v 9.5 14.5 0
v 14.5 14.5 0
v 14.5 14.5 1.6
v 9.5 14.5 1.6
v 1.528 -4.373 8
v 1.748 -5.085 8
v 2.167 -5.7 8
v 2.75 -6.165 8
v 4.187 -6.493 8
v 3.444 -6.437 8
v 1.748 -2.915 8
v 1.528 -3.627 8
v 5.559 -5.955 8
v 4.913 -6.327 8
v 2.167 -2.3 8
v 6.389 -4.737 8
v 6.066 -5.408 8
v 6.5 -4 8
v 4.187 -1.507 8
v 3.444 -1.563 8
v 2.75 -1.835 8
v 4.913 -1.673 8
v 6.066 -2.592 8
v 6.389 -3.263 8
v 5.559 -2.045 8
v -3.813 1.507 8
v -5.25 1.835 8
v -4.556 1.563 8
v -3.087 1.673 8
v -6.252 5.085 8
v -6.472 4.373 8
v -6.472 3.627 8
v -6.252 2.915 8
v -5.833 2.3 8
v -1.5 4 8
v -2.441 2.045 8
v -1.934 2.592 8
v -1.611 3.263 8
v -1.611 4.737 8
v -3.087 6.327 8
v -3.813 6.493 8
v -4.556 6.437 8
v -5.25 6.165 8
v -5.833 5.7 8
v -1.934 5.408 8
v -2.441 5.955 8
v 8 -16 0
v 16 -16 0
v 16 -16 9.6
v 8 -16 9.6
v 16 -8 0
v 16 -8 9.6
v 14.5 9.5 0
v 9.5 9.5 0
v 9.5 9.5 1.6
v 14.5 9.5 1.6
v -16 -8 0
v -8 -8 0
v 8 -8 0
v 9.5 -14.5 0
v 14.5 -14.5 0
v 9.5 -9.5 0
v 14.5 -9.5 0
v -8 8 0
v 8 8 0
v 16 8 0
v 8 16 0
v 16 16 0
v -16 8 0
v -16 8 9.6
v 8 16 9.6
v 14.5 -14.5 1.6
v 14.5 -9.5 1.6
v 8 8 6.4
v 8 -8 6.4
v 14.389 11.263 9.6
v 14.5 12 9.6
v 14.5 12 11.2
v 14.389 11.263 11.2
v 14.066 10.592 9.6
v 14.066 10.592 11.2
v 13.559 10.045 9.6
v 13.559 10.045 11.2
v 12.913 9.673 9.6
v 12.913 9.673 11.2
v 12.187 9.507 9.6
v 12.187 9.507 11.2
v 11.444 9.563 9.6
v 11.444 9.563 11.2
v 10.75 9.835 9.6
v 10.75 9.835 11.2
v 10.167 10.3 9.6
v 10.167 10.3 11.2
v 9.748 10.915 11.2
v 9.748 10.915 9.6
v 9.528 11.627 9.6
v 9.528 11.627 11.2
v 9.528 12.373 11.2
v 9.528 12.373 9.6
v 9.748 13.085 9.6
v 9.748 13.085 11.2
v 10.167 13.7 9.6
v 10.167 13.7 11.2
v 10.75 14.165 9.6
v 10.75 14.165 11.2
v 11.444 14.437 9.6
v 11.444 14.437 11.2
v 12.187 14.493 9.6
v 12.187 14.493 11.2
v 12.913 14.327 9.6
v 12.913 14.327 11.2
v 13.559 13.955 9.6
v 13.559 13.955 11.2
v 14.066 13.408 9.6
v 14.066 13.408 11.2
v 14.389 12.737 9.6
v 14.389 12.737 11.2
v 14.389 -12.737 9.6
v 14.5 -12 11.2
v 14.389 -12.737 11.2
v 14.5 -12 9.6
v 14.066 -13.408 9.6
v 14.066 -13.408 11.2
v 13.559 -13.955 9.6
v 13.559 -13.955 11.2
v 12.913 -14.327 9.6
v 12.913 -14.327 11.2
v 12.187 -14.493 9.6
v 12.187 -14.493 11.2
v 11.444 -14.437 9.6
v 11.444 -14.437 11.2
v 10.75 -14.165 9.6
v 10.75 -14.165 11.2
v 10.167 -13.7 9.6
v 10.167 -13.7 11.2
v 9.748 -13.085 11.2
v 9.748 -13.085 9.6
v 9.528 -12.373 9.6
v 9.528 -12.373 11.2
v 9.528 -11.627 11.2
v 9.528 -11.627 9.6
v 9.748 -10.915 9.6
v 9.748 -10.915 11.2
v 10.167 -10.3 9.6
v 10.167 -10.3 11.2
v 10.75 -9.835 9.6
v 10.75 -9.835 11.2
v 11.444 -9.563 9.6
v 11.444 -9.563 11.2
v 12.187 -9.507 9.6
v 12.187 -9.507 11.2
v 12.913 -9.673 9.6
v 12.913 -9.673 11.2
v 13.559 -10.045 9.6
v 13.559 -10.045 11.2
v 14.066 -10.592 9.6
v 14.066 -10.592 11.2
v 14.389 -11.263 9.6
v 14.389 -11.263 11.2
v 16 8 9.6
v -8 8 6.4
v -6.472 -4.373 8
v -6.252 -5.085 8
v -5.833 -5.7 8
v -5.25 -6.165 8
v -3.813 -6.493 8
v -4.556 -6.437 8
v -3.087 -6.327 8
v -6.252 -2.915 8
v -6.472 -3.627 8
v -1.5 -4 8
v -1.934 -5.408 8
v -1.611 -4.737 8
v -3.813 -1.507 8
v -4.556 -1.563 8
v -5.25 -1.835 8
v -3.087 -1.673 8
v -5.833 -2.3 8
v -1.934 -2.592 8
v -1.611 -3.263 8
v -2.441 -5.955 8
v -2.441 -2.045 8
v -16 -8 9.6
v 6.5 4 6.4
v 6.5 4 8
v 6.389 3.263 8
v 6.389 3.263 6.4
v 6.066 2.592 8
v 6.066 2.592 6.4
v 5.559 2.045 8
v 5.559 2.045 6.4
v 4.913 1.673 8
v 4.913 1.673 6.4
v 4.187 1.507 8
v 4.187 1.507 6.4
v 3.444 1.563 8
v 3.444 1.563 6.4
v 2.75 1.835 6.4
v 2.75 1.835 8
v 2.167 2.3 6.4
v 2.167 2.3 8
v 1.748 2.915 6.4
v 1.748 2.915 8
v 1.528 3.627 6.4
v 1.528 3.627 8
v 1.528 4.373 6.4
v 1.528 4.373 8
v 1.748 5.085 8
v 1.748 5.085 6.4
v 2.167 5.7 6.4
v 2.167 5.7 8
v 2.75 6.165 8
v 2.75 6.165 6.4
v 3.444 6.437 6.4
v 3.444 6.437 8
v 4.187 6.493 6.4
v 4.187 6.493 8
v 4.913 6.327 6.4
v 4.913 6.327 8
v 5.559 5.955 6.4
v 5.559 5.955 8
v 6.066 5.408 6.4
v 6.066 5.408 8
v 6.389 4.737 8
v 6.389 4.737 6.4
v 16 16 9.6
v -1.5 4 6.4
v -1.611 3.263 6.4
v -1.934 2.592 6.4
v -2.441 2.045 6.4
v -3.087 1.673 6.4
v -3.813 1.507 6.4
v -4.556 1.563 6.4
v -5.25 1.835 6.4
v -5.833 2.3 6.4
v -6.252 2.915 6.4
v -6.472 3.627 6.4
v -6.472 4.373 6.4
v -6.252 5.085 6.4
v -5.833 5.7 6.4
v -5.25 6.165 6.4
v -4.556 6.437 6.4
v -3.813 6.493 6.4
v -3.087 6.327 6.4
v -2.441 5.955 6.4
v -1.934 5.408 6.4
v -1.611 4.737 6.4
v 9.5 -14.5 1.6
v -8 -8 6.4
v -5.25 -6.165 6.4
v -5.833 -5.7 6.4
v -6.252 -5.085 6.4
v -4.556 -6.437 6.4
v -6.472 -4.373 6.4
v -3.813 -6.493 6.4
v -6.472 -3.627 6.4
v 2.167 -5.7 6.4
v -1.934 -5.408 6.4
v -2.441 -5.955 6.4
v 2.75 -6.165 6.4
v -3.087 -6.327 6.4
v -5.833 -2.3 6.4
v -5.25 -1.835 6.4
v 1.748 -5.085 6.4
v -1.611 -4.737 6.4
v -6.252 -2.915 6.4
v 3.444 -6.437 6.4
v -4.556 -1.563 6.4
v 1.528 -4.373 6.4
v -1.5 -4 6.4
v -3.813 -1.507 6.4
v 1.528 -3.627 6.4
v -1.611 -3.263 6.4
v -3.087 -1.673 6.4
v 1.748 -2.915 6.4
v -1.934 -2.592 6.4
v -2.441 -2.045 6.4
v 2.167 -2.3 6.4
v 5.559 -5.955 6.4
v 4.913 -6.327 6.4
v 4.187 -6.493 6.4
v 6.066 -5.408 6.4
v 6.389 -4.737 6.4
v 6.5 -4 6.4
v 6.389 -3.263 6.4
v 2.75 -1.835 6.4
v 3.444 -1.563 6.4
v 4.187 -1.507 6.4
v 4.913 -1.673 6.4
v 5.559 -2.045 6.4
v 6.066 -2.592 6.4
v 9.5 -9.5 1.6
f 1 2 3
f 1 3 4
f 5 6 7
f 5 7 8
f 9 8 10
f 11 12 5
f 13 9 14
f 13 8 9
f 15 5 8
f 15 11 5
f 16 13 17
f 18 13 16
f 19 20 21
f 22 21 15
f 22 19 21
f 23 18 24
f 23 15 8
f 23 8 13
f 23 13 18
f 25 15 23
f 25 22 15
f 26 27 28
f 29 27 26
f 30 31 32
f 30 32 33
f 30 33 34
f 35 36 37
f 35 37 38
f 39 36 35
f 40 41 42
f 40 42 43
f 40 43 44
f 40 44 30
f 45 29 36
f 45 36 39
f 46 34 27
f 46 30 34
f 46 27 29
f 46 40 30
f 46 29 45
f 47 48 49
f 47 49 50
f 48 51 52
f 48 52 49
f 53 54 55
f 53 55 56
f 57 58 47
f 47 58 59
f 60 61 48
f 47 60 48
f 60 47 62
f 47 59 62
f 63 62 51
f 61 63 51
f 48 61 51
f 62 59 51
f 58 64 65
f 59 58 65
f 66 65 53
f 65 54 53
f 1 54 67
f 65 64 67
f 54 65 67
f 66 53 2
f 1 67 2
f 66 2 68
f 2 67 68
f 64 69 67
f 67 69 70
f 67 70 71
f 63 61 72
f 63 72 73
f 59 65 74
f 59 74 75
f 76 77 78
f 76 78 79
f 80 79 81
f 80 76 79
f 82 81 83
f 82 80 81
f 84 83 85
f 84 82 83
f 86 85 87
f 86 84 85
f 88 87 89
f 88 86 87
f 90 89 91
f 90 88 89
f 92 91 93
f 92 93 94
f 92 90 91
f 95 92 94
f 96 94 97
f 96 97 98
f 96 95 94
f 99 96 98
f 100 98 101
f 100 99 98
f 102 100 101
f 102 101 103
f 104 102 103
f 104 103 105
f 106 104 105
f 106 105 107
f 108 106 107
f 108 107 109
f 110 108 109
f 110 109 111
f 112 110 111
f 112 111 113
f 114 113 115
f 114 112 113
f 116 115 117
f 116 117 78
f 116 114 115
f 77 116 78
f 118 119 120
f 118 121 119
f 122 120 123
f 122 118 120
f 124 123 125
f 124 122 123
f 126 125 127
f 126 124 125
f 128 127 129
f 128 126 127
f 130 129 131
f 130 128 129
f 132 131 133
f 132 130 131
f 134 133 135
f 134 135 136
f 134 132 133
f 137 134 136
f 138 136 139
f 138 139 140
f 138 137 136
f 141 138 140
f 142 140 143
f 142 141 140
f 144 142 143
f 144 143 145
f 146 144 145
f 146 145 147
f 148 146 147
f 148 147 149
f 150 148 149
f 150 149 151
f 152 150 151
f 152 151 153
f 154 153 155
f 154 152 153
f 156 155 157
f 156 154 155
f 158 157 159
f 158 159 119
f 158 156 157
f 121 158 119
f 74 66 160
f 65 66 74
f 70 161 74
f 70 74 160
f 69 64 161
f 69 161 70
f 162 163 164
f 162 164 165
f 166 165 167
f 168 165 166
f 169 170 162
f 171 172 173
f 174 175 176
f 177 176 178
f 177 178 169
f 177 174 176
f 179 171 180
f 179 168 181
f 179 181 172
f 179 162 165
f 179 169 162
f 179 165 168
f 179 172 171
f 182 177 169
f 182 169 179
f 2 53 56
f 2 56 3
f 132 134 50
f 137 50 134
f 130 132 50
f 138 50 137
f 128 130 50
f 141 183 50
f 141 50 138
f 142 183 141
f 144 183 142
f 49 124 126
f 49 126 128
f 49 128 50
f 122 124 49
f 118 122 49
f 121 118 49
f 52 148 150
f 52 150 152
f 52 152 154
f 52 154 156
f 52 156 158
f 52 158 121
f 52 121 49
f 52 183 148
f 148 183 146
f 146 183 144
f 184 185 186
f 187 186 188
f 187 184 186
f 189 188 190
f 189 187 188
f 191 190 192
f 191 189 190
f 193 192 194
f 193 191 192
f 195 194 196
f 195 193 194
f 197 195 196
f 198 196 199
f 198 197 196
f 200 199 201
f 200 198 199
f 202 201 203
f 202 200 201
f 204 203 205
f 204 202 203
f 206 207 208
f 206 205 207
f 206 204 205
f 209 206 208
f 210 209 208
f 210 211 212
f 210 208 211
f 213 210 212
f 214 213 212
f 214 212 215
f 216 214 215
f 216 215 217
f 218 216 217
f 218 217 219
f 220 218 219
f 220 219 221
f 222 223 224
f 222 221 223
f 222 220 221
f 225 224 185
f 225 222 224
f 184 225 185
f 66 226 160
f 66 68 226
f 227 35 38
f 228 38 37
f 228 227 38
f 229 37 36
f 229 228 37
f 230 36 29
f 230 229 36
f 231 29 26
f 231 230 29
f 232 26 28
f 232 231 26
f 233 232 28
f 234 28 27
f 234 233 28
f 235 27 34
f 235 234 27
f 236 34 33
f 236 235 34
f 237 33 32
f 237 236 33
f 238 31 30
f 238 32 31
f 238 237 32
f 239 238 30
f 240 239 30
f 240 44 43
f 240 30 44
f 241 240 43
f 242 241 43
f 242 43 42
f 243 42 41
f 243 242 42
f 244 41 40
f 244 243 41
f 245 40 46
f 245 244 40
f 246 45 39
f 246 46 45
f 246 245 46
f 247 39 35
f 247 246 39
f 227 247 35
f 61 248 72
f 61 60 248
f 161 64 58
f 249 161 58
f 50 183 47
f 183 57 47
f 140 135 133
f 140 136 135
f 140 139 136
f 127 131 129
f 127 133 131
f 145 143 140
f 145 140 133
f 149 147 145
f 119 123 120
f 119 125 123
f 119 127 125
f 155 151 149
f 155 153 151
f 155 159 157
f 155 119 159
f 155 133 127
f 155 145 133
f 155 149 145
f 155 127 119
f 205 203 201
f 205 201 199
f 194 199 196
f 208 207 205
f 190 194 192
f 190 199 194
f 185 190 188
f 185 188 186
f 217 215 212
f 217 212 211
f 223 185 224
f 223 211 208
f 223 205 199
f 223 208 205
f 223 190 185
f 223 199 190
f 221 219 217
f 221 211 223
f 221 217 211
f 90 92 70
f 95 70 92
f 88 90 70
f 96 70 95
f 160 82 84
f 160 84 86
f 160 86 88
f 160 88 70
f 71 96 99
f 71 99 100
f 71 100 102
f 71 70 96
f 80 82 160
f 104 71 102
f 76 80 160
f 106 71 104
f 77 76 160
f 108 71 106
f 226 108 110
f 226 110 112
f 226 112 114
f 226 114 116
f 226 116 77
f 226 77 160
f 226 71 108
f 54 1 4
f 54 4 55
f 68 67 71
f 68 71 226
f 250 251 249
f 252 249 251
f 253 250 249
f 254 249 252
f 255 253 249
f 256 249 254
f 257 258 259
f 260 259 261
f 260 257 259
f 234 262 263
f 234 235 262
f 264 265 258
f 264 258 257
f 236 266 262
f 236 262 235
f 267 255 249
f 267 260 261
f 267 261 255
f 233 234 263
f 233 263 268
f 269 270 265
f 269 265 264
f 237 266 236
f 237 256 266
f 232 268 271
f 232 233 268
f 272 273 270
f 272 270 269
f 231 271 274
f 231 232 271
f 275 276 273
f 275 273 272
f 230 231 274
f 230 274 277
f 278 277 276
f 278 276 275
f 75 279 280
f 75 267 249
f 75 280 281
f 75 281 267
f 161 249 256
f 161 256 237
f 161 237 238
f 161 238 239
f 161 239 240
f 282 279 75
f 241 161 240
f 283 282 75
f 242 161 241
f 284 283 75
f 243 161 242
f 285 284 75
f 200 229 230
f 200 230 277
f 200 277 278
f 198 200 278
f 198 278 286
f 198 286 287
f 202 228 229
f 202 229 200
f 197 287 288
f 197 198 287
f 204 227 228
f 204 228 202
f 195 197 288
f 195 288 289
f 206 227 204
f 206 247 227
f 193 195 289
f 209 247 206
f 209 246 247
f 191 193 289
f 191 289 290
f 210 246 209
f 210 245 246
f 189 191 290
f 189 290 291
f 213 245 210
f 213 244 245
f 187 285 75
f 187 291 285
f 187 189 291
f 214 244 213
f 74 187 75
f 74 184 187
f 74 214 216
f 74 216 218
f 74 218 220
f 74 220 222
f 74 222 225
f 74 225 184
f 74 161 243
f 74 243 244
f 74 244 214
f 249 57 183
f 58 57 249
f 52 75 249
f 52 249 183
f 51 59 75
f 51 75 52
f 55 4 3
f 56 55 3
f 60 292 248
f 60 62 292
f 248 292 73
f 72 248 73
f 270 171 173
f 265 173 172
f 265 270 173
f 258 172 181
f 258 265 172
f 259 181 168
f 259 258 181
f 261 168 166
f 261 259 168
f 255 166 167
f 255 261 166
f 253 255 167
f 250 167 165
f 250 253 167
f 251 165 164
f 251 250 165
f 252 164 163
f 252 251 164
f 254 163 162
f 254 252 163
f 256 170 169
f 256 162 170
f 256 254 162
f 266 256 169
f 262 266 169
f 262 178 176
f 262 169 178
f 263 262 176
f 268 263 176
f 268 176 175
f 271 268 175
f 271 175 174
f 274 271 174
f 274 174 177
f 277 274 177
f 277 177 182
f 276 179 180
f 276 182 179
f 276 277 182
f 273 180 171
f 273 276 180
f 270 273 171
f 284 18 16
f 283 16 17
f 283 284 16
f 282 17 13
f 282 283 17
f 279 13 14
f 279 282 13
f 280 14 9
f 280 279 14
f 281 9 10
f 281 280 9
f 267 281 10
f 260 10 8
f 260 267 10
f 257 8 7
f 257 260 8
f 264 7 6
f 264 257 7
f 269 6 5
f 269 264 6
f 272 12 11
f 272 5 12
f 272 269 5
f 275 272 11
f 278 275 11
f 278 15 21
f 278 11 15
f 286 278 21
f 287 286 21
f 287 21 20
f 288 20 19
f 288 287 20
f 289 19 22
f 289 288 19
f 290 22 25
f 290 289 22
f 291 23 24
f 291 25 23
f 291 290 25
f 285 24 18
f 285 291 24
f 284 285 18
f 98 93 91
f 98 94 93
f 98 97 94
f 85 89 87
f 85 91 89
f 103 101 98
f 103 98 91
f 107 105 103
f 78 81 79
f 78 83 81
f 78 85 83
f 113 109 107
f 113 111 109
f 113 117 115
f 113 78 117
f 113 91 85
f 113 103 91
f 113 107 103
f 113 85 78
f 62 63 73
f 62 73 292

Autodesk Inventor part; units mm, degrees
ref_plane "YZ Plane" through (0, 0, 0) normal (1, 0, 0) x (0, 1, 0)
ref_plane "XZ Plane" through (0, 0, 0) normal (0, 1, 0) x (-1, 0, 0)
ref_plane "XY Plane" through (0, 0, 0) normal (0, 0, 1) x (1, 0, 0)
sketch "Sketch1" plane through (0, 0, 0) normal (0, 0, 1) x (1, 0, 0)
  line L0 (0, -22.4) -> (0, 22.4) construction
  line L1 (-22.4, 0) -> (22.4, 0) construction
  line L2 (-16, 16) -> (16, 16)
  line L3 (16, 16) -> (16, -16)
  line L4 (16, -16) -> (-16, -16)
  line L5 (-16, -16) -> (-16, 16)
  line L6 (16, 8) -> (-16, 8)
  line L7 (8, 8) -> (8, -8)
  line L8 (-16, -8) -> (16, -8)
  line L9 (-16, 8) -> (8, 16)
  line L10 (-16, -8) -> (8, -16)
  line L11 (8, -8) -> (16, -16) construction
  line L12 (8, 8) -> (16, 16) construction
  line L13 (-8, 8) -> (-8, -8)
  line L14 (-4, 4) -> (4, 4) construction
  line L15 (4, 4) -> (4, -4) construction
  line L16 (4, -4) -> (-4, -4) construction
  line L17 (-4, -4) -> (-4, 4) construction
  circle A0 centre (-4, 4) radius 2.5
  circle A1 centre (4, 4) radius 2.5
  circle A2 centre (4, -4) radius 2.5
  circle A3 centre (-4, -4) radius 2.5
  circle A4 centre (12, 12) radius 2.5
  circle A5 centre (12, -12) radius 2.5
  line L18 (9.5, -14.5) -> (14.5, -14.5)
  line L19 (14.5, -14.5) -> (14.5, -9.5)
  line L20 (14.5, -9.5) -> (9.5, -9.5)
  line L21 (9.5, -9.5) -> (9.5, -14.5)
  line L22 (9.5, 9.5) -> (14.5, 9.5)
  line L23 (14.5, 9.5) -> (14.5, 14.5)
  line L24 (14.5, 14.5) -> (9.5, 14.5)
  line L25 (9.5, 14.5) -> (9.5, 9.5)
  point P0 (-16, 0)
  point P1 (0, 16)
  point P2 (8, 0)
  point P3 (0, 4)
  point P4 (4, 0)
  dimension "d0" = 32
  dimension "d1" = 32
  dimension "d2" = 8
  dimension "d3" = 16
  dimension "d4" = 16
  dimension "d5" = 8
  dimension "d6" = 5
extrude "Extrusion1" add sketch "Sketch1" along normal blind 9.6 contours L2 L3 L6 L9 | L8 L3 L4 L10 | A4 | L23 L22 A4 | A4 L24 L23 | A4 L25 L24 | L22 L25 A4 | A5 | L19 L18 A5 | A5 L20 L19 | A5 L21 L20 | L18 L21 A5
extrude "Extrusion5" add sketch "Sketch1" along normal blind 6.4 contours L6 L7 L8 L13 | A0 | A1 | A2 | A3
extrude "Extrusion6" add sketch "Sketch1" along normal blind 8 contours A0 | A1 | A2 | A3
extrude "Extrusion7" add sketch "Sketch1" along normal blind 11.2 contours A4 | A5
extrude "Extrusion8" cut sketch "Sketch1" along normal blind 1.6 contours A4 | L23 L22 A4 | A4 L24 L23 | A4 L25 L24 | L22 L25 A4 | A5 | L19 L18 A5 | A5 L20 L19 | A5 L21 L20 | L18 L21 A5
properties part number "LEGO Brick 2399" material "Steel"
